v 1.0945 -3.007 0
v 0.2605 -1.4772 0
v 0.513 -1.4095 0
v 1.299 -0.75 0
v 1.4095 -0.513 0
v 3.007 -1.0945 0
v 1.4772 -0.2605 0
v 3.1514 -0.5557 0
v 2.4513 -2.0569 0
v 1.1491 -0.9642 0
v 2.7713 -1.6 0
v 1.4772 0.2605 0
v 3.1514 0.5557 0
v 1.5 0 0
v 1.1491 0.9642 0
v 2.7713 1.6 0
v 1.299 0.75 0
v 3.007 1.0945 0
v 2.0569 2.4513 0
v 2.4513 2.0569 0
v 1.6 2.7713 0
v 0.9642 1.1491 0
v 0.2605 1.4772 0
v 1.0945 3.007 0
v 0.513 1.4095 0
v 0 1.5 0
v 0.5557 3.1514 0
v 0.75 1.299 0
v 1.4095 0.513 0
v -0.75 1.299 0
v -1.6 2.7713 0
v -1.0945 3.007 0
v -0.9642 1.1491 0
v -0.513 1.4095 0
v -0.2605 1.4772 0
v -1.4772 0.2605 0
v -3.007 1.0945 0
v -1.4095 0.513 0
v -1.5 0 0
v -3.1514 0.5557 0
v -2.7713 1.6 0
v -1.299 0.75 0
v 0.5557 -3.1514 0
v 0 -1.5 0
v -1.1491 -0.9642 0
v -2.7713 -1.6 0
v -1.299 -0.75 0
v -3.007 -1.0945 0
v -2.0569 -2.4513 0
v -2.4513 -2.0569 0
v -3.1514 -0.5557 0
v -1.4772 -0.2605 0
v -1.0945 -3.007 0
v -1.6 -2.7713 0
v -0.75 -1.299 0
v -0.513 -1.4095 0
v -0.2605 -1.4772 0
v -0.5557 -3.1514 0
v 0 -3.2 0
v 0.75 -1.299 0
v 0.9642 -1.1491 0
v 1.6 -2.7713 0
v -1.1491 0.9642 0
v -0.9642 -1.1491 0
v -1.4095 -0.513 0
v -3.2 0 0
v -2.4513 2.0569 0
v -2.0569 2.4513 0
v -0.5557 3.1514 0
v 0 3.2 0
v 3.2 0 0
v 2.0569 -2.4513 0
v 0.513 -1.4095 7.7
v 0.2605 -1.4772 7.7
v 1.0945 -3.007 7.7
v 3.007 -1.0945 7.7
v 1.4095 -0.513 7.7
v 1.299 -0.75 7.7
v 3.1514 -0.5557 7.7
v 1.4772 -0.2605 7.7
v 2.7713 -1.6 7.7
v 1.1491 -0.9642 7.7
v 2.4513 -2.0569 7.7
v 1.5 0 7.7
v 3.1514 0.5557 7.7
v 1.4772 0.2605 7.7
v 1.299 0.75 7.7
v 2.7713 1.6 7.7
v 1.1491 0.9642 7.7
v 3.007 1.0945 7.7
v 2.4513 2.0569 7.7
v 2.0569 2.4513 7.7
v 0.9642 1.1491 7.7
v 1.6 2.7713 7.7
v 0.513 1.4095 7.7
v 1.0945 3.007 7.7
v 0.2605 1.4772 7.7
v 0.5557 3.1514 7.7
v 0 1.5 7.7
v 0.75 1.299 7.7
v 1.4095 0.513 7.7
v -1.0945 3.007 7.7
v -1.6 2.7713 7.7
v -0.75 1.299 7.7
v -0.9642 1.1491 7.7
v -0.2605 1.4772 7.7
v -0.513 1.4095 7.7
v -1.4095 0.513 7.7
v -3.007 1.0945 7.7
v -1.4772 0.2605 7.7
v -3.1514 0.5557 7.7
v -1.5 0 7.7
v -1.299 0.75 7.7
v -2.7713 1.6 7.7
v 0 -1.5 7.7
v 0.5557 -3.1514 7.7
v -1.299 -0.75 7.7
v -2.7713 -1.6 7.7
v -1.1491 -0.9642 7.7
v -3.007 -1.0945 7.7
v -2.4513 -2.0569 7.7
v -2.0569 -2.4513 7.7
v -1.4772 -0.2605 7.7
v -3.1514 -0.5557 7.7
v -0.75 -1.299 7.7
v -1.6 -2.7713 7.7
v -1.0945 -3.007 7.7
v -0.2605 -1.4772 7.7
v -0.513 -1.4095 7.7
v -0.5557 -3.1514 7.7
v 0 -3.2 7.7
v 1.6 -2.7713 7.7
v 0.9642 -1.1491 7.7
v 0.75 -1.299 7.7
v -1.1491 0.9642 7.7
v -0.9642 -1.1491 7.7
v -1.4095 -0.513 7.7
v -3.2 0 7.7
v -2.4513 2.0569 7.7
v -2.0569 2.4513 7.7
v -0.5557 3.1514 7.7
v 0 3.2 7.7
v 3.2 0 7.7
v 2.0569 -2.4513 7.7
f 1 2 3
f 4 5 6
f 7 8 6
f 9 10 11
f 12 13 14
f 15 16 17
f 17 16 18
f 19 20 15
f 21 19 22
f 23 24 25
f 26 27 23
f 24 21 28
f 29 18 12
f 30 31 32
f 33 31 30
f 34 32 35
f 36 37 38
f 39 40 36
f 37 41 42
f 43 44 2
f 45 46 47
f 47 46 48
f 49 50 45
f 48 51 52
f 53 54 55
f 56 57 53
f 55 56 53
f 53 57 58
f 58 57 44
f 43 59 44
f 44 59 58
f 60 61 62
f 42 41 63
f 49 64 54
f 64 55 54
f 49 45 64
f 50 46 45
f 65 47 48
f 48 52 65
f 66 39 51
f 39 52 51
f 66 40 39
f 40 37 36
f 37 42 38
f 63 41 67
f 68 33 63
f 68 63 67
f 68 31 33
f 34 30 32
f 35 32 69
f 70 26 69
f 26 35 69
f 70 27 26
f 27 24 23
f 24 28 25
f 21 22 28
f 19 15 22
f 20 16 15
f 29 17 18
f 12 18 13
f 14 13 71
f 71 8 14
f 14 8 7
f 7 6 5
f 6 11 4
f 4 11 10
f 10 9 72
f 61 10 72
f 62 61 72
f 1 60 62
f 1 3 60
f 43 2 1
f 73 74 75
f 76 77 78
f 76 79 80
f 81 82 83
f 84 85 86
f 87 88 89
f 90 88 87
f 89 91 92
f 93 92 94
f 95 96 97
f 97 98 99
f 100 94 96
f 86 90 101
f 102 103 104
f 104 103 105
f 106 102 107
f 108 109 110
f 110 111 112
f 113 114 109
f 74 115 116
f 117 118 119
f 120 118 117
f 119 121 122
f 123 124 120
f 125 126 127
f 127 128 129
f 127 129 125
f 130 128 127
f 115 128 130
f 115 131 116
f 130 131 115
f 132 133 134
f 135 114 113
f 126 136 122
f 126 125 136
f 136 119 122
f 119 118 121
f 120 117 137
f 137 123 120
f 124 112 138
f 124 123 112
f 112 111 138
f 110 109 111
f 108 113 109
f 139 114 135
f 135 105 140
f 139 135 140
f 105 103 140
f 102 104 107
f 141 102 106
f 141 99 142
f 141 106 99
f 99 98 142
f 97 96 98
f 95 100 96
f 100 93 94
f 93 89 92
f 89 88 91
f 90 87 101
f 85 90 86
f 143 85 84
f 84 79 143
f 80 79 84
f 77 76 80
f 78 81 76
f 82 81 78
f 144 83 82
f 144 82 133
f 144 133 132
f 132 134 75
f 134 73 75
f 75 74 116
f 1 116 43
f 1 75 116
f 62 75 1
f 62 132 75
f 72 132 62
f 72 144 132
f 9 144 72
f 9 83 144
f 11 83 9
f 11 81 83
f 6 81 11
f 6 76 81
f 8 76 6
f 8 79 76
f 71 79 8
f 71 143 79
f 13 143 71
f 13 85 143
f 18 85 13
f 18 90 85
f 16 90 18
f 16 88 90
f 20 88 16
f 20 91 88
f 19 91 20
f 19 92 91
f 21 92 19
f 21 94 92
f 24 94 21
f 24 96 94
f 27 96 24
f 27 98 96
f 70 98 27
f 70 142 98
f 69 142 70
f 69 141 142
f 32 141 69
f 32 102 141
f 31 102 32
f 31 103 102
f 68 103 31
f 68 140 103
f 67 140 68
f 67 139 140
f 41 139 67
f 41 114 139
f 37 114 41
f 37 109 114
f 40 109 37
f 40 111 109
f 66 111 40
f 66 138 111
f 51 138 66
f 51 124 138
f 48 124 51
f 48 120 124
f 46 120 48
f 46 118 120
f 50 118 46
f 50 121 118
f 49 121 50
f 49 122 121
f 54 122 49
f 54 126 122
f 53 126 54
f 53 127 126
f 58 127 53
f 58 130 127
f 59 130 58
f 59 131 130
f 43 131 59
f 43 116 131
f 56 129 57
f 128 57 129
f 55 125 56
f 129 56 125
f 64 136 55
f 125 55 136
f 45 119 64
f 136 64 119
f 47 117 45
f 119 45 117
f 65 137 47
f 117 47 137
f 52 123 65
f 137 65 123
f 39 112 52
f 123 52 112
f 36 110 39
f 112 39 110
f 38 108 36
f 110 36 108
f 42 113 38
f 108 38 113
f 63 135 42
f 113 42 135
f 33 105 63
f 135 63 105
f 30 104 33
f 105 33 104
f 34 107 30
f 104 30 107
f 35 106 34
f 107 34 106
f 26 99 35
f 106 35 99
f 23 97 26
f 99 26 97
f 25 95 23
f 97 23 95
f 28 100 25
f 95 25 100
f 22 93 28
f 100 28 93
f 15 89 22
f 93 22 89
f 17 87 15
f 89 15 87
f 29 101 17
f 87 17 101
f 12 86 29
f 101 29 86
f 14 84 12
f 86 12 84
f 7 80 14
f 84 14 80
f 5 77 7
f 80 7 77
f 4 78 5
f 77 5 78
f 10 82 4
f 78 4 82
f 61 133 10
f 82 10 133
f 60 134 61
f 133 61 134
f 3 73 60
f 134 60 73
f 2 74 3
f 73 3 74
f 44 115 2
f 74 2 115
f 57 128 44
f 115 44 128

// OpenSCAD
id = 3;
od = 6.4;
h = 7.7;

$fn = 36;

linear_extrude(height=h) difference() { circle(d=od); circle(d=id); }
